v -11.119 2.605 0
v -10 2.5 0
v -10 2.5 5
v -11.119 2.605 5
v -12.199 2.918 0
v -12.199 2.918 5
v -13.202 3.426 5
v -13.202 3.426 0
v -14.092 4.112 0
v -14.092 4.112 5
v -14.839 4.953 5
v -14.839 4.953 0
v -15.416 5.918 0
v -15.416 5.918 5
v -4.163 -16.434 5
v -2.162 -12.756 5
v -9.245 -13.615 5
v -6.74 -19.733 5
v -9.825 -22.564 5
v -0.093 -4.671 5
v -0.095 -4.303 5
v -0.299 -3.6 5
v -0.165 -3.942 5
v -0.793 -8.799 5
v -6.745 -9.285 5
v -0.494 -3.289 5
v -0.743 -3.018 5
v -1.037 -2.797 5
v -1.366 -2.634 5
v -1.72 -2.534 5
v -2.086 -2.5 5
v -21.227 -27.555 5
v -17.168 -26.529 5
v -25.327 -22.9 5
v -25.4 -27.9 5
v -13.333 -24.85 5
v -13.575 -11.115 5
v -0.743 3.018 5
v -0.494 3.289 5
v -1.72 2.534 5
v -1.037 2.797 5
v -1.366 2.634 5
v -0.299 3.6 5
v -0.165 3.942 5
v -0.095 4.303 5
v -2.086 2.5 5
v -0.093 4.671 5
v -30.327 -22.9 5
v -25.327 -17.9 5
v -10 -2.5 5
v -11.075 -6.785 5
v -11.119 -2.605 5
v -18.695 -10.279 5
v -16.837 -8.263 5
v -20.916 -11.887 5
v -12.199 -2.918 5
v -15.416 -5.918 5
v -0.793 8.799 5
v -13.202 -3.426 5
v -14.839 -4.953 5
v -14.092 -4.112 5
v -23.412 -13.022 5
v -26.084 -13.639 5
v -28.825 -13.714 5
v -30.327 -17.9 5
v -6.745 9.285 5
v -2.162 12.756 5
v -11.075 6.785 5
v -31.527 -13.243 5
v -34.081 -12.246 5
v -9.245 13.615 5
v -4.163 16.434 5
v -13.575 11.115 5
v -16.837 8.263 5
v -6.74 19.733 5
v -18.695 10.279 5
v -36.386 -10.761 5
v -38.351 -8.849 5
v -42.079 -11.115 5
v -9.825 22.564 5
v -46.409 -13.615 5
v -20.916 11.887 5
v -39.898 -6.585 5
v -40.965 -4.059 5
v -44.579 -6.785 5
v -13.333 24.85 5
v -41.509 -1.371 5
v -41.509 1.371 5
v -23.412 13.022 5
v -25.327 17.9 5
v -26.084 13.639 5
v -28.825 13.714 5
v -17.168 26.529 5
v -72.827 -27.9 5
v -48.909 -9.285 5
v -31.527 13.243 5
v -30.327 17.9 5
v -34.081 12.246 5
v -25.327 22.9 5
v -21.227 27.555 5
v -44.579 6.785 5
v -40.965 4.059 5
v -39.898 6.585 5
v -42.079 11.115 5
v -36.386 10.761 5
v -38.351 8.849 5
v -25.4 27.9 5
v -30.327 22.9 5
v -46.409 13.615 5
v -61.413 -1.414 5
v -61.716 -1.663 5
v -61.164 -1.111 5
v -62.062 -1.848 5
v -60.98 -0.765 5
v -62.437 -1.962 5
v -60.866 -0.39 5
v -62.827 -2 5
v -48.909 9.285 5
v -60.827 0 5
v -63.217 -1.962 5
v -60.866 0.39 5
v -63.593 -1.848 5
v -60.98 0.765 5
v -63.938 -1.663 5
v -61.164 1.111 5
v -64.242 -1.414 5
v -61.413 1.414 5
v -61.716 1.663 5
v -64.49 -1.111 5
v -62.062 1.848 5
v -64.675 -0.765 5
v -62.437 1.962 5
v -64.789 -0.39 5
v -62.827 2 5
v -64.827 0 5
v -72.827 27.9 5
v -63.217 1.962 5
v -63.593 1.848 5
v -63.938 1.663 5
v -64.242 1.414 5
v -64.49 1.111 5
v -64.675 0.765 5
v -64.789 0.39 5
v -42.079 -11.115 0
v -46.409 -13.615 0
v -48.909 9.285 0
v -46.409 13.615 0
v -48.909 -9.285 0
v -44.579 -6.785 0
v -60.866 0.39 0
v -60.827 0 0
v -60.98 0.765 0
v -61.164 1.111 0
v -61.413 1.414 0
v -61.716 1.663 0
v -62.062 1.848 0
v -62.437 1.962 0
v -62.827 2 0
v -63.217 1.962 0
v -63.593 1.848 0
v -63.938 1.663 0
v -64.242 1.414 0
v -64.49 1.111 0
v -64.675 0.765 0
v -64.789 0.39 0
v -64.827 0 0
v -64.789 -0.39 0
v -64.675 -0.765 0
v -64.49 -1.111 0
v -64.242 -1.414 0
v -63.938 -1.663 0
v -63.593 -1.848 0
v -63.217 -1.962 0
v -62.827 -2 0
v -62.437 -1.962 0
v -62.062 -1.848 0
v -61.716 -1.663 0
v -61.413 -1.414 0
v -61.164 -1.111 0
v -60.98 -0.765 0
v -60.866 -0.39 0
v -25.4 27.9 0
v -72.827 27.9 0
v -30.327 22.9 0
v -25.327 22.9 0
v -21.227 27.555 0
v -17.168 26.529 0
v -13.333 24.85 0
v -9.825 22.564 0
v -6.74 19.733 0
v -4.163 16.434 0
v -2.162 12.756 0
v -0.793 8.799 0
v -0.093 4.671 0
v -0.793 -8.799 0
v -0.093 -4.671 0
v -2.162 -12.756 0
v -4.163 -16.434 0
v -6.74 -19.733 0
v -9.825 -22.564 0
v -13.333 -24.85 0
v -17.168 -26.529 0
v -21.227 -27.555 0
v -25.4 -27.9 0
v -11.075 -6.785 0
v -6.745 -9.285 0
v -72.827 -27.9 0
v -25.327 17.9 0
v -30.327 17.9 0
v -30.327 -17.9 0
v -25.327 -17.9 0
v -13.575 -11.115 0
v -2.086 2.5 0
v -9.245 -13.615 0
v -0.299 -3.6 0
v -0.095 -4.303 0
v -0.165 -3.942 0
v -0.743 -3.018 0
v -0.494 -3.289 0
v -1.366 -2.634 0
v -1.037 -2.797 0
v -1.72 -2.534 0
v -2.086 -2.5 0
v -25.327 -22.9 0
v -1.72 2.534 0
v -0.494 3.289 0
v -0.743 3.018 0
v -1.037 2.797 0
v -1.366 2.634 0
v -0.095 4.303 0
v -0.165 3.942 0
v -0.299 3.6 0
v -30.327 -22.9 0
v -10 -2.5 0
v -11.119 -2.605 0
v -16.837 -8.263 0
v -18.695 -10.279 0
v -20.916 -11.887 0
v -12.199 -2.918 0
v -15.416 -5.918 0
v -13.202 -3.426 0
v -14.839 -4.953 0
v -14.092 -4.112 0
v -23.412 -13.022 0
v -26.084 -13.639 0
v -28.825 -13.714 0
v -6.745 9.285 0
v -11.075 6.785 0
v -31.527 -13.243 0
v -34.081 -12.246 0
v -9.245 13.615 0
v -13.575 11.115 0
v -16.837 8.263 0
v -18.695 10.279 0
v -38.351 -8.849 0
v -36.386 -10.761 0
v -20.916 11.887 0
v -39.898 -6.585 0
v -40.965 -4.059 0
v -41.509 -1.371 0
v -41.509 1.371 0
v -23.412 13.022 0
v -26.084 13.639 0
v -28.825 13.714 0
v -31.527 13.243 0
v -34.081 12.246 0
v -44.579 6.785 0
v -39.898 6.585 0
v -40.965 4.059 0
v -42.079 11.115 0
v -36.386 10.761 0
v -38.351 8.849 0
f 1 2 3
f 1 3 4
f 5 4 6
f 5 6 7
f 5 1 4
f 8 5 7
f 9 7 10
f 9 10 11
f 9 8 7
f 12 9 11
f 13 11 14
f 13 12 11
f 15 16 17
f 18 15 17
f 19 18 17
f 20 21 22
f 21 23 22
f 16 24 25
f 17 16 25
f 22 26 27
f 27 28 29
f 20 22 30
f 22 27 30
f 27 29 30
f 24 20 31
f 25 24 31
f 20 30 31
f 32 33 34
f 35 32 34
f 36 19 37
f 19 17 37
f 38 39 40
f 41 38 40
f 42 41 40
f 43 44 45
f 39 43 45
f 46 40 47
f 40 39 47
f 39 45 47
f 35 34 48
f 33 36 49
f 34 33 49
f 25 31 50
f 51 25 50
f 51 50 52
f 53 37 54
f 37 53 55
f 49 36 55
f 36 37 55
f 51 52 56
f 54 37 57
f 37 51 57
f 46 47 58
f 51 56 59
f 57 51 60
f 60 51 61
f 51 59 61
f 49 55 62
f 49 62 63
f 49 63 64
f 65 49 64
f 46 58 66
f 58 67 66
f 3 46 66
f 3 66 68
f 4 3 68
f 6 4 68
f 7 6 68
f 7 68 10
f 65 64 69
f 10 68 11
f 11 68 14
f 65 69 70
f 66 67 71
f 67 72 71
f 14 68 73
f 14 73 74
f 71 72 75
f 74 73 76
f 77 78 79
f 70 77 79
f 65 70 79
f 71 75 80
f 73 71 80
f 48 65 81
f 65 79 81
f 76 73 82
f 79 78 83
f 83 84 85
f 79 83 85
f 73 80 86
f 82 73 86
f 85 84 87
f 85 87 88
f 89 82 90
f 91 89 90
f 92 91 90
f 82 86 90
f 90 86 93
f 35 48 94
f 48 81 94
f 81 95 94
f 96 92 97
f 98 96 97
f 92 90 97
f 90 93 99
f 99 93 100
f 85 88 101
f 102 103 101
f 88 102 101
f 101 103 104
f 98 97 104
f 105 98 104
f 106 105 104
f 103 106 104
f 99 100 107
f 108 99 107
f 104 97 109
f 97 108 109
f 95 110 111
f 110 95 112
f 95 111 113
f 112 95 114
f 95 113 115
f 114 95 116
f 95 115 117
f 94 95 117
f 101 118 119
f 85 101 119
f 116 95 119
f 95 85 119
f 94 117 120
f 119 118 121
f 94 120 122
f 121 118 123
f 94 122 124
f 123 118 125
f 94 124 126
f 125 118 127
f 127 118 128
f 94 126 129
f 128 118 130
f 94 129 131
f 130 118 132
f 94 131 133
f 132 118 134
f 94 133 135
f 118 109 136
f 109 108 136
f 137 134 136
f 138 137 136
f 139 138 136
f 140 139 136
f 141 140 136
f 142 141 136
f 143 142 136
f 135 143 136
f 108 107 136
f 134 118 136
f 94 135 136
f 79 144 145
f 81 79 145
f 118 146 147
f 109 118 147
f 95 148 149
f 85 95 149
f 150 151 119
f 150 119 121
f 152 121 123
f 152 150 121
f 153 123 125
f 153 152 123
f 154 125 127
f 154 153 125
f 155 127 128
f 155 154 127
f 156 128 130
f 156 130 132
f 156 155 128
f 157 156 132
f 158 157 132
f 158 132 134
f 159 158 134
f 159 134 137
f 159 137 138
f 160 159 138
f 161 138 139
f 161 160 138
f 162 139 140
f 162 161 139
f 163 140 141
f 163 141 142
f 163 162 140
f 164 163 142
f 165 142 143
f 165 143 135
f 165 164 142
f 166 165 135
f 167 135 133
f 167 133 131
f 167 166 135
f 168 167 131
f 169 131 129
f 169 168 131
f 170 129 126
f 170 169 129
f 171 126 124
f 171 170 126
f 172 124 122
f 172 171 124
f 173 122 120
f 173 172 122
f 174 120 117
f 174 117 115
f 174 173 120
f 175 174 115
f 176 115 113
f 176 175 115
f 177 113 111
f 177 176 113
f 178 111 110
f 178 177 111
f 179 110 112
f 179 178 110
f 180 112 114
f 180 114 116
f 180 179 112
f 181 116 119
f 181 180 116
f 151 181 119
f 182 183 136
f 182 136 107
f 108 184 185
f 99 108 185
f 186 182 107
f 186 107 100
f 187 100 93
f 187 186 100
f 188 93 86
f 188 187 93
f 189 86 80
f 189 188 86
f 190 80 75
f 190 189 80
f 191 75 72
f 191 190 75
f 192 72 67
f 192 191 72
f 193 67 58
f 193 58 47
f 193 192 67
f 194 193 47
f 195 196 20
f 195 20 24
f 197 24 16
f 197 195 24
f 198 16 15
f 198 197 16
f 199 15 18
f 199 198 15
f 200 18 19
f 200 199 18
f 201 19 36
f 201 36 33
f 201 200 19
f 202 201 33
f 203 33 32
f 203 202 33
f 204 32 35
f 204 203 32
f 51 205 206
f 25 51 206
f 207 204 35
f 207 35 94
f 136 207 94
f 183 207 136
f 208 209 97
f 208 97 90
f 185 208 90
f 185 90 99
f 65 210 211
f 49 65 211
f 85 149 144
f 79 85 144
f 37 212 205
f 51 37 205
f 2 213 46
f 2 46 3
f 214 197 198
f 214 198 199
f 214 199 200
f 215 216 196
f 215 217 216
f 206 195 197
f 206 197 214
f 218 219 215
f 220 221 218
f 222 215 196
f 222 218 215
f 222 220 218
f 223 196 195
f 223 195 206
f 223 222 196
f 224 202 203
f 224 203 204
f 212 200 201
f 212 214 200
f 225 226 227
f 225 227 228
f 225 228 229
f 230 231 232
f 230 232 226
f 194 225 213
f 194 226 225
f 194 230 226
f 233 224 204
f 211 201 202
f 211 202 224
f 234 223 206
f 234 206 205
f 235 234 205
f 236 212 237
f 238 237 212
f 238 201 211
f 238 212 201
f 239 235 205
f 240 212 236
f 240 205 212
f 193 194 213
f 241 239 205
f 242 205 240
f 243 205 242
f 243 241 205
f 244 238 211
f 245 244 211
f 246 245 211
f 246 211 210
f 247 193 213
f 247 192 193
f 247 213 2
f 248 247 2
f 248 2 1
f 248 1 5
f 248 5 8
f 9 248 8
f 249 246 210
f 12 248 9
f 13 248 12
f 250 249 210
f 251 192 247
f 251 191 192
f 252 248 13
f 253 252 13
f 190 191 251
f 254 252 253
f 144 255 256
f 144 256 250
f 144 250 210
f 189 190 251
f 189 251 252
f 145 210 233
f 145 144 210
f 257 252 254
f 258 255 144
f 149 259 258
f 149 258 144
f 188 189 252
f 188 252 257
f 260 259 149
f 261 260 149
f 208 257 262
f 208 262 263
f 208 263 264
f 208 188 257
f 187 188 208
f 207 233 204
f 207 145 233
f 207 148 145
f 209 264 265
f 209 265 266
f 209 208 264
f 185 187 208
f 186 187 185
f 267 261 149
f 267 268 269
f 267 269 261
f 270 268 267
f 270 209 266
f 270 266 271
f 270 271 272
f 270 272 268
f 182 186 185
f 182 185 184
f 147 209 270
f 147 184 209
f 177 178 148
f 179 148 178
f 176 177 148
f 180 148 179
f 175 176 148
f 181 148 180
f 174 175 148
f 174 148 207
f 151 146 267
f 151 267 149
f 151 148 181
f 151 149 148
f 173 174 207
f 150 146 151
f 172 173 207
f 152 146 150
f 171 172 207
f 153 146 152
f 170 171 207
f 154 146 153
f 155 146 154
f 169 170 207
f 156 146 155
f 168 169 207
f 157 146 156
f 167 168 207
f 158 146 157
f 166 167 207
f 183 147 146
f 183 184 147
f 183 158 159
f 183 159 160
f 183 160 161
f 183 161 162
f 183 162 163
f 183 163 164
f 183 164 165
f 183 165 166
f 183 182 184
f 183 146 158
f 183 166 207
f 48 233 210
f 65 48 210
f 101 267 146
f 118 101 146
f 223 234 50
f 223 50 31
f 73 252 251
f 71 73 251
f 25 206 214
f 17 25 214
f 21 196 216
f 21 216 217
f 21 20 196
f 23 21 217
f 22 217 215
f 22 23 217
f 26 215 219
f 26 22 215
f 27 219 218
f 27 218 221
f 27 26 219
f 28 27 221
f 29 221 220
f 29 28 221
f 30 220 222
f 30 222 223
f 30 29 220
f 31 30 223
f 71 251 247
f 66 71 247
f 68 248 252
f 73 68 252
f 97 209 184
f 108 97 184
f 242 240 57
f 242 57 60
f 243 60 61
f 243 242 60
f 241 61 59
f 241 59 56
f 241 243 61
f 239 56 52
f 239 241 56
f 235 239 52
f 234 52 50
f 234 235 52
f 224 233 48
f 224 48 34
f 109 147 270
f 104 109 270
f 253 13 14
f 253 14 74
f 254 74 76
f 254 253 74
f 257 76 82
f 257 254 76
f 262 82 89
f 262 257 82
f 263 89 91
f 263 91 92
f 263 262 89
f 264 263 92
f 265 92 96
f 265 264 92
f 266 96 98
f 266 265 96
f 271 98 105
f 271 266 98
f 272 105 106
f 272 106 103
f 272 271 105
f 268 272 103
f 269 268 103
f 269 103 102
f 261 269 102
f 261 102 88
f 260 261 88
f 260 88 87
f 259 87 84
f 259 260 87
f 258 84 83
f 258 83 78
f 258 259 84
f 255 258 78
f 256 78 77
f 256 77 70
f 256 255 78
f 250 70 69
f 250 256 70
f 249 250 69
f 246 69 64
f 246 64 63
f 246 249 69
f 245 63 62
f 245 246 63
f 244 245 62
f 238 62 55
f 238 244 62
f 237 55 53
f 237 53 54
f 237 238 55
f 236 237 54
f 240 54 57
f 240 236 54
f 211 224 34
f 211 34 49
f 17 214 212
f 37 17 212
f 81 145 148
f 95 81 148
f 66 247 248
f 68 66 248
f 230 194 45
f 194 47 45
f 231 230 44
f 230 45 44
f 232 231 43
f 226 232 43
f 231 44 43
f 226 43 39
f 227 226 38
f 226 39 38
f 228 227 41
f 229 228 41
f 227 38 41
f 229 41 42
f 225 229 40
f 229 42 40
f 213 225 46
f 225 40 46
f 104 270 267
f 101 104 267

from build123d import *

# Parameters (mm, degrees)
ESQUISSE1_R        = 2
ESQUISSE1_W        = 5
ESQUISSE1_H        = 5
BOSS_EXTRU_1_DEPTH = 5
CONG_1_R           = 2


with BuildPart() as part:
    # Esquisse1 → Boss.-Extru.1 (new body)
    with BuildSketch(Plane.XY):
        with BuildLine():
            Line((-72.827296486, -27.9), (-72.827296486, 27.9))
            Line((-72.827296486, 27.9), (-25.4, 27.9))
            ThreePointArc((-25.4, 27.9), (-7.439487758, 20.460512242), (0, 2.5))
            Line((0, 2.5), (-10, 2.5))
            ThreePointArc((-10, 2.5), (-13.202056301, 3.42586604), (-15.41588754, 5.917721519))
            ThreePointArc((-15.41588754, 5.917721519), (-41.577296486, 0), (-15.41588754, -5.917721519))
            ThreePointArc((-15.41588754, -5.917721519), (-13.202056301, -3.42586604), (-10, -2.5))
            Line((-10, -2.5), (0, -2.5))
            ThreePointArc((0, -2.5), (-7.439487758, -20.460512242), (-25.4, -27.9))
            Line((-25.4, -27.9), (-72.827296486, -27.9))
        make_face()
        with Locations((-62.827296486, 0)):
            Circle(ESQUISSE1_R, mode=Mode.SUBTRACT)
        with Locations((-27.827296486, 20.4)):
            Rectangle(ESQUISSE1_W, ESQUISSE1_H, mode=Mode.SUBTRACT)
        Polygon((-9.245314739, 13.615063509), (-6.745314739, 9.284936491), (-11.075441758, 6.784936491), (-13.575441758, 11.115063509), align=None, mode=Mode.SUBTRACT)
        Polygon((-6.745314739, -9.284936491), (-9.245314739, -13.615063509), (-13.575441758, -11.115063509), (-11.075441758, -6.784936491), align=None, mode=Mode.SUBTRACT)
        with Locations((-27.827296486, -20.4)):
            Rectangle(ESQUISSE1_W, ESQUISSE1_H, mode=Mode.SUBTRACT)
        Polygon((-46.409278233, -13.615063509), (-48.909278233, -9.284936491), (-44.579151214, -6.784936491), (-42.079151214, -11.115063509), align=None, mode=Mode.SUBTRACT)
        Polygon((-48.909278233, 9.284936491), (-46.409278233, 13.615063509), (-42.079151214, 11.115063509), (-44.579151214, 6.784936491), align=None, mode=Mode.SUBTRACT)
    extrude(amount=BOSS_EXTRU_1_DEPTH)

    # Congé1
    cong_1_edges = [part.edges().sort_by_distance(p)[0] for p in [
        (0, 2.5, 2.5),
        (0, -2.5, 2.5),
    ]]
    fillet(cong_1_edges, radius=CONG_1_R)


solid = part.part
